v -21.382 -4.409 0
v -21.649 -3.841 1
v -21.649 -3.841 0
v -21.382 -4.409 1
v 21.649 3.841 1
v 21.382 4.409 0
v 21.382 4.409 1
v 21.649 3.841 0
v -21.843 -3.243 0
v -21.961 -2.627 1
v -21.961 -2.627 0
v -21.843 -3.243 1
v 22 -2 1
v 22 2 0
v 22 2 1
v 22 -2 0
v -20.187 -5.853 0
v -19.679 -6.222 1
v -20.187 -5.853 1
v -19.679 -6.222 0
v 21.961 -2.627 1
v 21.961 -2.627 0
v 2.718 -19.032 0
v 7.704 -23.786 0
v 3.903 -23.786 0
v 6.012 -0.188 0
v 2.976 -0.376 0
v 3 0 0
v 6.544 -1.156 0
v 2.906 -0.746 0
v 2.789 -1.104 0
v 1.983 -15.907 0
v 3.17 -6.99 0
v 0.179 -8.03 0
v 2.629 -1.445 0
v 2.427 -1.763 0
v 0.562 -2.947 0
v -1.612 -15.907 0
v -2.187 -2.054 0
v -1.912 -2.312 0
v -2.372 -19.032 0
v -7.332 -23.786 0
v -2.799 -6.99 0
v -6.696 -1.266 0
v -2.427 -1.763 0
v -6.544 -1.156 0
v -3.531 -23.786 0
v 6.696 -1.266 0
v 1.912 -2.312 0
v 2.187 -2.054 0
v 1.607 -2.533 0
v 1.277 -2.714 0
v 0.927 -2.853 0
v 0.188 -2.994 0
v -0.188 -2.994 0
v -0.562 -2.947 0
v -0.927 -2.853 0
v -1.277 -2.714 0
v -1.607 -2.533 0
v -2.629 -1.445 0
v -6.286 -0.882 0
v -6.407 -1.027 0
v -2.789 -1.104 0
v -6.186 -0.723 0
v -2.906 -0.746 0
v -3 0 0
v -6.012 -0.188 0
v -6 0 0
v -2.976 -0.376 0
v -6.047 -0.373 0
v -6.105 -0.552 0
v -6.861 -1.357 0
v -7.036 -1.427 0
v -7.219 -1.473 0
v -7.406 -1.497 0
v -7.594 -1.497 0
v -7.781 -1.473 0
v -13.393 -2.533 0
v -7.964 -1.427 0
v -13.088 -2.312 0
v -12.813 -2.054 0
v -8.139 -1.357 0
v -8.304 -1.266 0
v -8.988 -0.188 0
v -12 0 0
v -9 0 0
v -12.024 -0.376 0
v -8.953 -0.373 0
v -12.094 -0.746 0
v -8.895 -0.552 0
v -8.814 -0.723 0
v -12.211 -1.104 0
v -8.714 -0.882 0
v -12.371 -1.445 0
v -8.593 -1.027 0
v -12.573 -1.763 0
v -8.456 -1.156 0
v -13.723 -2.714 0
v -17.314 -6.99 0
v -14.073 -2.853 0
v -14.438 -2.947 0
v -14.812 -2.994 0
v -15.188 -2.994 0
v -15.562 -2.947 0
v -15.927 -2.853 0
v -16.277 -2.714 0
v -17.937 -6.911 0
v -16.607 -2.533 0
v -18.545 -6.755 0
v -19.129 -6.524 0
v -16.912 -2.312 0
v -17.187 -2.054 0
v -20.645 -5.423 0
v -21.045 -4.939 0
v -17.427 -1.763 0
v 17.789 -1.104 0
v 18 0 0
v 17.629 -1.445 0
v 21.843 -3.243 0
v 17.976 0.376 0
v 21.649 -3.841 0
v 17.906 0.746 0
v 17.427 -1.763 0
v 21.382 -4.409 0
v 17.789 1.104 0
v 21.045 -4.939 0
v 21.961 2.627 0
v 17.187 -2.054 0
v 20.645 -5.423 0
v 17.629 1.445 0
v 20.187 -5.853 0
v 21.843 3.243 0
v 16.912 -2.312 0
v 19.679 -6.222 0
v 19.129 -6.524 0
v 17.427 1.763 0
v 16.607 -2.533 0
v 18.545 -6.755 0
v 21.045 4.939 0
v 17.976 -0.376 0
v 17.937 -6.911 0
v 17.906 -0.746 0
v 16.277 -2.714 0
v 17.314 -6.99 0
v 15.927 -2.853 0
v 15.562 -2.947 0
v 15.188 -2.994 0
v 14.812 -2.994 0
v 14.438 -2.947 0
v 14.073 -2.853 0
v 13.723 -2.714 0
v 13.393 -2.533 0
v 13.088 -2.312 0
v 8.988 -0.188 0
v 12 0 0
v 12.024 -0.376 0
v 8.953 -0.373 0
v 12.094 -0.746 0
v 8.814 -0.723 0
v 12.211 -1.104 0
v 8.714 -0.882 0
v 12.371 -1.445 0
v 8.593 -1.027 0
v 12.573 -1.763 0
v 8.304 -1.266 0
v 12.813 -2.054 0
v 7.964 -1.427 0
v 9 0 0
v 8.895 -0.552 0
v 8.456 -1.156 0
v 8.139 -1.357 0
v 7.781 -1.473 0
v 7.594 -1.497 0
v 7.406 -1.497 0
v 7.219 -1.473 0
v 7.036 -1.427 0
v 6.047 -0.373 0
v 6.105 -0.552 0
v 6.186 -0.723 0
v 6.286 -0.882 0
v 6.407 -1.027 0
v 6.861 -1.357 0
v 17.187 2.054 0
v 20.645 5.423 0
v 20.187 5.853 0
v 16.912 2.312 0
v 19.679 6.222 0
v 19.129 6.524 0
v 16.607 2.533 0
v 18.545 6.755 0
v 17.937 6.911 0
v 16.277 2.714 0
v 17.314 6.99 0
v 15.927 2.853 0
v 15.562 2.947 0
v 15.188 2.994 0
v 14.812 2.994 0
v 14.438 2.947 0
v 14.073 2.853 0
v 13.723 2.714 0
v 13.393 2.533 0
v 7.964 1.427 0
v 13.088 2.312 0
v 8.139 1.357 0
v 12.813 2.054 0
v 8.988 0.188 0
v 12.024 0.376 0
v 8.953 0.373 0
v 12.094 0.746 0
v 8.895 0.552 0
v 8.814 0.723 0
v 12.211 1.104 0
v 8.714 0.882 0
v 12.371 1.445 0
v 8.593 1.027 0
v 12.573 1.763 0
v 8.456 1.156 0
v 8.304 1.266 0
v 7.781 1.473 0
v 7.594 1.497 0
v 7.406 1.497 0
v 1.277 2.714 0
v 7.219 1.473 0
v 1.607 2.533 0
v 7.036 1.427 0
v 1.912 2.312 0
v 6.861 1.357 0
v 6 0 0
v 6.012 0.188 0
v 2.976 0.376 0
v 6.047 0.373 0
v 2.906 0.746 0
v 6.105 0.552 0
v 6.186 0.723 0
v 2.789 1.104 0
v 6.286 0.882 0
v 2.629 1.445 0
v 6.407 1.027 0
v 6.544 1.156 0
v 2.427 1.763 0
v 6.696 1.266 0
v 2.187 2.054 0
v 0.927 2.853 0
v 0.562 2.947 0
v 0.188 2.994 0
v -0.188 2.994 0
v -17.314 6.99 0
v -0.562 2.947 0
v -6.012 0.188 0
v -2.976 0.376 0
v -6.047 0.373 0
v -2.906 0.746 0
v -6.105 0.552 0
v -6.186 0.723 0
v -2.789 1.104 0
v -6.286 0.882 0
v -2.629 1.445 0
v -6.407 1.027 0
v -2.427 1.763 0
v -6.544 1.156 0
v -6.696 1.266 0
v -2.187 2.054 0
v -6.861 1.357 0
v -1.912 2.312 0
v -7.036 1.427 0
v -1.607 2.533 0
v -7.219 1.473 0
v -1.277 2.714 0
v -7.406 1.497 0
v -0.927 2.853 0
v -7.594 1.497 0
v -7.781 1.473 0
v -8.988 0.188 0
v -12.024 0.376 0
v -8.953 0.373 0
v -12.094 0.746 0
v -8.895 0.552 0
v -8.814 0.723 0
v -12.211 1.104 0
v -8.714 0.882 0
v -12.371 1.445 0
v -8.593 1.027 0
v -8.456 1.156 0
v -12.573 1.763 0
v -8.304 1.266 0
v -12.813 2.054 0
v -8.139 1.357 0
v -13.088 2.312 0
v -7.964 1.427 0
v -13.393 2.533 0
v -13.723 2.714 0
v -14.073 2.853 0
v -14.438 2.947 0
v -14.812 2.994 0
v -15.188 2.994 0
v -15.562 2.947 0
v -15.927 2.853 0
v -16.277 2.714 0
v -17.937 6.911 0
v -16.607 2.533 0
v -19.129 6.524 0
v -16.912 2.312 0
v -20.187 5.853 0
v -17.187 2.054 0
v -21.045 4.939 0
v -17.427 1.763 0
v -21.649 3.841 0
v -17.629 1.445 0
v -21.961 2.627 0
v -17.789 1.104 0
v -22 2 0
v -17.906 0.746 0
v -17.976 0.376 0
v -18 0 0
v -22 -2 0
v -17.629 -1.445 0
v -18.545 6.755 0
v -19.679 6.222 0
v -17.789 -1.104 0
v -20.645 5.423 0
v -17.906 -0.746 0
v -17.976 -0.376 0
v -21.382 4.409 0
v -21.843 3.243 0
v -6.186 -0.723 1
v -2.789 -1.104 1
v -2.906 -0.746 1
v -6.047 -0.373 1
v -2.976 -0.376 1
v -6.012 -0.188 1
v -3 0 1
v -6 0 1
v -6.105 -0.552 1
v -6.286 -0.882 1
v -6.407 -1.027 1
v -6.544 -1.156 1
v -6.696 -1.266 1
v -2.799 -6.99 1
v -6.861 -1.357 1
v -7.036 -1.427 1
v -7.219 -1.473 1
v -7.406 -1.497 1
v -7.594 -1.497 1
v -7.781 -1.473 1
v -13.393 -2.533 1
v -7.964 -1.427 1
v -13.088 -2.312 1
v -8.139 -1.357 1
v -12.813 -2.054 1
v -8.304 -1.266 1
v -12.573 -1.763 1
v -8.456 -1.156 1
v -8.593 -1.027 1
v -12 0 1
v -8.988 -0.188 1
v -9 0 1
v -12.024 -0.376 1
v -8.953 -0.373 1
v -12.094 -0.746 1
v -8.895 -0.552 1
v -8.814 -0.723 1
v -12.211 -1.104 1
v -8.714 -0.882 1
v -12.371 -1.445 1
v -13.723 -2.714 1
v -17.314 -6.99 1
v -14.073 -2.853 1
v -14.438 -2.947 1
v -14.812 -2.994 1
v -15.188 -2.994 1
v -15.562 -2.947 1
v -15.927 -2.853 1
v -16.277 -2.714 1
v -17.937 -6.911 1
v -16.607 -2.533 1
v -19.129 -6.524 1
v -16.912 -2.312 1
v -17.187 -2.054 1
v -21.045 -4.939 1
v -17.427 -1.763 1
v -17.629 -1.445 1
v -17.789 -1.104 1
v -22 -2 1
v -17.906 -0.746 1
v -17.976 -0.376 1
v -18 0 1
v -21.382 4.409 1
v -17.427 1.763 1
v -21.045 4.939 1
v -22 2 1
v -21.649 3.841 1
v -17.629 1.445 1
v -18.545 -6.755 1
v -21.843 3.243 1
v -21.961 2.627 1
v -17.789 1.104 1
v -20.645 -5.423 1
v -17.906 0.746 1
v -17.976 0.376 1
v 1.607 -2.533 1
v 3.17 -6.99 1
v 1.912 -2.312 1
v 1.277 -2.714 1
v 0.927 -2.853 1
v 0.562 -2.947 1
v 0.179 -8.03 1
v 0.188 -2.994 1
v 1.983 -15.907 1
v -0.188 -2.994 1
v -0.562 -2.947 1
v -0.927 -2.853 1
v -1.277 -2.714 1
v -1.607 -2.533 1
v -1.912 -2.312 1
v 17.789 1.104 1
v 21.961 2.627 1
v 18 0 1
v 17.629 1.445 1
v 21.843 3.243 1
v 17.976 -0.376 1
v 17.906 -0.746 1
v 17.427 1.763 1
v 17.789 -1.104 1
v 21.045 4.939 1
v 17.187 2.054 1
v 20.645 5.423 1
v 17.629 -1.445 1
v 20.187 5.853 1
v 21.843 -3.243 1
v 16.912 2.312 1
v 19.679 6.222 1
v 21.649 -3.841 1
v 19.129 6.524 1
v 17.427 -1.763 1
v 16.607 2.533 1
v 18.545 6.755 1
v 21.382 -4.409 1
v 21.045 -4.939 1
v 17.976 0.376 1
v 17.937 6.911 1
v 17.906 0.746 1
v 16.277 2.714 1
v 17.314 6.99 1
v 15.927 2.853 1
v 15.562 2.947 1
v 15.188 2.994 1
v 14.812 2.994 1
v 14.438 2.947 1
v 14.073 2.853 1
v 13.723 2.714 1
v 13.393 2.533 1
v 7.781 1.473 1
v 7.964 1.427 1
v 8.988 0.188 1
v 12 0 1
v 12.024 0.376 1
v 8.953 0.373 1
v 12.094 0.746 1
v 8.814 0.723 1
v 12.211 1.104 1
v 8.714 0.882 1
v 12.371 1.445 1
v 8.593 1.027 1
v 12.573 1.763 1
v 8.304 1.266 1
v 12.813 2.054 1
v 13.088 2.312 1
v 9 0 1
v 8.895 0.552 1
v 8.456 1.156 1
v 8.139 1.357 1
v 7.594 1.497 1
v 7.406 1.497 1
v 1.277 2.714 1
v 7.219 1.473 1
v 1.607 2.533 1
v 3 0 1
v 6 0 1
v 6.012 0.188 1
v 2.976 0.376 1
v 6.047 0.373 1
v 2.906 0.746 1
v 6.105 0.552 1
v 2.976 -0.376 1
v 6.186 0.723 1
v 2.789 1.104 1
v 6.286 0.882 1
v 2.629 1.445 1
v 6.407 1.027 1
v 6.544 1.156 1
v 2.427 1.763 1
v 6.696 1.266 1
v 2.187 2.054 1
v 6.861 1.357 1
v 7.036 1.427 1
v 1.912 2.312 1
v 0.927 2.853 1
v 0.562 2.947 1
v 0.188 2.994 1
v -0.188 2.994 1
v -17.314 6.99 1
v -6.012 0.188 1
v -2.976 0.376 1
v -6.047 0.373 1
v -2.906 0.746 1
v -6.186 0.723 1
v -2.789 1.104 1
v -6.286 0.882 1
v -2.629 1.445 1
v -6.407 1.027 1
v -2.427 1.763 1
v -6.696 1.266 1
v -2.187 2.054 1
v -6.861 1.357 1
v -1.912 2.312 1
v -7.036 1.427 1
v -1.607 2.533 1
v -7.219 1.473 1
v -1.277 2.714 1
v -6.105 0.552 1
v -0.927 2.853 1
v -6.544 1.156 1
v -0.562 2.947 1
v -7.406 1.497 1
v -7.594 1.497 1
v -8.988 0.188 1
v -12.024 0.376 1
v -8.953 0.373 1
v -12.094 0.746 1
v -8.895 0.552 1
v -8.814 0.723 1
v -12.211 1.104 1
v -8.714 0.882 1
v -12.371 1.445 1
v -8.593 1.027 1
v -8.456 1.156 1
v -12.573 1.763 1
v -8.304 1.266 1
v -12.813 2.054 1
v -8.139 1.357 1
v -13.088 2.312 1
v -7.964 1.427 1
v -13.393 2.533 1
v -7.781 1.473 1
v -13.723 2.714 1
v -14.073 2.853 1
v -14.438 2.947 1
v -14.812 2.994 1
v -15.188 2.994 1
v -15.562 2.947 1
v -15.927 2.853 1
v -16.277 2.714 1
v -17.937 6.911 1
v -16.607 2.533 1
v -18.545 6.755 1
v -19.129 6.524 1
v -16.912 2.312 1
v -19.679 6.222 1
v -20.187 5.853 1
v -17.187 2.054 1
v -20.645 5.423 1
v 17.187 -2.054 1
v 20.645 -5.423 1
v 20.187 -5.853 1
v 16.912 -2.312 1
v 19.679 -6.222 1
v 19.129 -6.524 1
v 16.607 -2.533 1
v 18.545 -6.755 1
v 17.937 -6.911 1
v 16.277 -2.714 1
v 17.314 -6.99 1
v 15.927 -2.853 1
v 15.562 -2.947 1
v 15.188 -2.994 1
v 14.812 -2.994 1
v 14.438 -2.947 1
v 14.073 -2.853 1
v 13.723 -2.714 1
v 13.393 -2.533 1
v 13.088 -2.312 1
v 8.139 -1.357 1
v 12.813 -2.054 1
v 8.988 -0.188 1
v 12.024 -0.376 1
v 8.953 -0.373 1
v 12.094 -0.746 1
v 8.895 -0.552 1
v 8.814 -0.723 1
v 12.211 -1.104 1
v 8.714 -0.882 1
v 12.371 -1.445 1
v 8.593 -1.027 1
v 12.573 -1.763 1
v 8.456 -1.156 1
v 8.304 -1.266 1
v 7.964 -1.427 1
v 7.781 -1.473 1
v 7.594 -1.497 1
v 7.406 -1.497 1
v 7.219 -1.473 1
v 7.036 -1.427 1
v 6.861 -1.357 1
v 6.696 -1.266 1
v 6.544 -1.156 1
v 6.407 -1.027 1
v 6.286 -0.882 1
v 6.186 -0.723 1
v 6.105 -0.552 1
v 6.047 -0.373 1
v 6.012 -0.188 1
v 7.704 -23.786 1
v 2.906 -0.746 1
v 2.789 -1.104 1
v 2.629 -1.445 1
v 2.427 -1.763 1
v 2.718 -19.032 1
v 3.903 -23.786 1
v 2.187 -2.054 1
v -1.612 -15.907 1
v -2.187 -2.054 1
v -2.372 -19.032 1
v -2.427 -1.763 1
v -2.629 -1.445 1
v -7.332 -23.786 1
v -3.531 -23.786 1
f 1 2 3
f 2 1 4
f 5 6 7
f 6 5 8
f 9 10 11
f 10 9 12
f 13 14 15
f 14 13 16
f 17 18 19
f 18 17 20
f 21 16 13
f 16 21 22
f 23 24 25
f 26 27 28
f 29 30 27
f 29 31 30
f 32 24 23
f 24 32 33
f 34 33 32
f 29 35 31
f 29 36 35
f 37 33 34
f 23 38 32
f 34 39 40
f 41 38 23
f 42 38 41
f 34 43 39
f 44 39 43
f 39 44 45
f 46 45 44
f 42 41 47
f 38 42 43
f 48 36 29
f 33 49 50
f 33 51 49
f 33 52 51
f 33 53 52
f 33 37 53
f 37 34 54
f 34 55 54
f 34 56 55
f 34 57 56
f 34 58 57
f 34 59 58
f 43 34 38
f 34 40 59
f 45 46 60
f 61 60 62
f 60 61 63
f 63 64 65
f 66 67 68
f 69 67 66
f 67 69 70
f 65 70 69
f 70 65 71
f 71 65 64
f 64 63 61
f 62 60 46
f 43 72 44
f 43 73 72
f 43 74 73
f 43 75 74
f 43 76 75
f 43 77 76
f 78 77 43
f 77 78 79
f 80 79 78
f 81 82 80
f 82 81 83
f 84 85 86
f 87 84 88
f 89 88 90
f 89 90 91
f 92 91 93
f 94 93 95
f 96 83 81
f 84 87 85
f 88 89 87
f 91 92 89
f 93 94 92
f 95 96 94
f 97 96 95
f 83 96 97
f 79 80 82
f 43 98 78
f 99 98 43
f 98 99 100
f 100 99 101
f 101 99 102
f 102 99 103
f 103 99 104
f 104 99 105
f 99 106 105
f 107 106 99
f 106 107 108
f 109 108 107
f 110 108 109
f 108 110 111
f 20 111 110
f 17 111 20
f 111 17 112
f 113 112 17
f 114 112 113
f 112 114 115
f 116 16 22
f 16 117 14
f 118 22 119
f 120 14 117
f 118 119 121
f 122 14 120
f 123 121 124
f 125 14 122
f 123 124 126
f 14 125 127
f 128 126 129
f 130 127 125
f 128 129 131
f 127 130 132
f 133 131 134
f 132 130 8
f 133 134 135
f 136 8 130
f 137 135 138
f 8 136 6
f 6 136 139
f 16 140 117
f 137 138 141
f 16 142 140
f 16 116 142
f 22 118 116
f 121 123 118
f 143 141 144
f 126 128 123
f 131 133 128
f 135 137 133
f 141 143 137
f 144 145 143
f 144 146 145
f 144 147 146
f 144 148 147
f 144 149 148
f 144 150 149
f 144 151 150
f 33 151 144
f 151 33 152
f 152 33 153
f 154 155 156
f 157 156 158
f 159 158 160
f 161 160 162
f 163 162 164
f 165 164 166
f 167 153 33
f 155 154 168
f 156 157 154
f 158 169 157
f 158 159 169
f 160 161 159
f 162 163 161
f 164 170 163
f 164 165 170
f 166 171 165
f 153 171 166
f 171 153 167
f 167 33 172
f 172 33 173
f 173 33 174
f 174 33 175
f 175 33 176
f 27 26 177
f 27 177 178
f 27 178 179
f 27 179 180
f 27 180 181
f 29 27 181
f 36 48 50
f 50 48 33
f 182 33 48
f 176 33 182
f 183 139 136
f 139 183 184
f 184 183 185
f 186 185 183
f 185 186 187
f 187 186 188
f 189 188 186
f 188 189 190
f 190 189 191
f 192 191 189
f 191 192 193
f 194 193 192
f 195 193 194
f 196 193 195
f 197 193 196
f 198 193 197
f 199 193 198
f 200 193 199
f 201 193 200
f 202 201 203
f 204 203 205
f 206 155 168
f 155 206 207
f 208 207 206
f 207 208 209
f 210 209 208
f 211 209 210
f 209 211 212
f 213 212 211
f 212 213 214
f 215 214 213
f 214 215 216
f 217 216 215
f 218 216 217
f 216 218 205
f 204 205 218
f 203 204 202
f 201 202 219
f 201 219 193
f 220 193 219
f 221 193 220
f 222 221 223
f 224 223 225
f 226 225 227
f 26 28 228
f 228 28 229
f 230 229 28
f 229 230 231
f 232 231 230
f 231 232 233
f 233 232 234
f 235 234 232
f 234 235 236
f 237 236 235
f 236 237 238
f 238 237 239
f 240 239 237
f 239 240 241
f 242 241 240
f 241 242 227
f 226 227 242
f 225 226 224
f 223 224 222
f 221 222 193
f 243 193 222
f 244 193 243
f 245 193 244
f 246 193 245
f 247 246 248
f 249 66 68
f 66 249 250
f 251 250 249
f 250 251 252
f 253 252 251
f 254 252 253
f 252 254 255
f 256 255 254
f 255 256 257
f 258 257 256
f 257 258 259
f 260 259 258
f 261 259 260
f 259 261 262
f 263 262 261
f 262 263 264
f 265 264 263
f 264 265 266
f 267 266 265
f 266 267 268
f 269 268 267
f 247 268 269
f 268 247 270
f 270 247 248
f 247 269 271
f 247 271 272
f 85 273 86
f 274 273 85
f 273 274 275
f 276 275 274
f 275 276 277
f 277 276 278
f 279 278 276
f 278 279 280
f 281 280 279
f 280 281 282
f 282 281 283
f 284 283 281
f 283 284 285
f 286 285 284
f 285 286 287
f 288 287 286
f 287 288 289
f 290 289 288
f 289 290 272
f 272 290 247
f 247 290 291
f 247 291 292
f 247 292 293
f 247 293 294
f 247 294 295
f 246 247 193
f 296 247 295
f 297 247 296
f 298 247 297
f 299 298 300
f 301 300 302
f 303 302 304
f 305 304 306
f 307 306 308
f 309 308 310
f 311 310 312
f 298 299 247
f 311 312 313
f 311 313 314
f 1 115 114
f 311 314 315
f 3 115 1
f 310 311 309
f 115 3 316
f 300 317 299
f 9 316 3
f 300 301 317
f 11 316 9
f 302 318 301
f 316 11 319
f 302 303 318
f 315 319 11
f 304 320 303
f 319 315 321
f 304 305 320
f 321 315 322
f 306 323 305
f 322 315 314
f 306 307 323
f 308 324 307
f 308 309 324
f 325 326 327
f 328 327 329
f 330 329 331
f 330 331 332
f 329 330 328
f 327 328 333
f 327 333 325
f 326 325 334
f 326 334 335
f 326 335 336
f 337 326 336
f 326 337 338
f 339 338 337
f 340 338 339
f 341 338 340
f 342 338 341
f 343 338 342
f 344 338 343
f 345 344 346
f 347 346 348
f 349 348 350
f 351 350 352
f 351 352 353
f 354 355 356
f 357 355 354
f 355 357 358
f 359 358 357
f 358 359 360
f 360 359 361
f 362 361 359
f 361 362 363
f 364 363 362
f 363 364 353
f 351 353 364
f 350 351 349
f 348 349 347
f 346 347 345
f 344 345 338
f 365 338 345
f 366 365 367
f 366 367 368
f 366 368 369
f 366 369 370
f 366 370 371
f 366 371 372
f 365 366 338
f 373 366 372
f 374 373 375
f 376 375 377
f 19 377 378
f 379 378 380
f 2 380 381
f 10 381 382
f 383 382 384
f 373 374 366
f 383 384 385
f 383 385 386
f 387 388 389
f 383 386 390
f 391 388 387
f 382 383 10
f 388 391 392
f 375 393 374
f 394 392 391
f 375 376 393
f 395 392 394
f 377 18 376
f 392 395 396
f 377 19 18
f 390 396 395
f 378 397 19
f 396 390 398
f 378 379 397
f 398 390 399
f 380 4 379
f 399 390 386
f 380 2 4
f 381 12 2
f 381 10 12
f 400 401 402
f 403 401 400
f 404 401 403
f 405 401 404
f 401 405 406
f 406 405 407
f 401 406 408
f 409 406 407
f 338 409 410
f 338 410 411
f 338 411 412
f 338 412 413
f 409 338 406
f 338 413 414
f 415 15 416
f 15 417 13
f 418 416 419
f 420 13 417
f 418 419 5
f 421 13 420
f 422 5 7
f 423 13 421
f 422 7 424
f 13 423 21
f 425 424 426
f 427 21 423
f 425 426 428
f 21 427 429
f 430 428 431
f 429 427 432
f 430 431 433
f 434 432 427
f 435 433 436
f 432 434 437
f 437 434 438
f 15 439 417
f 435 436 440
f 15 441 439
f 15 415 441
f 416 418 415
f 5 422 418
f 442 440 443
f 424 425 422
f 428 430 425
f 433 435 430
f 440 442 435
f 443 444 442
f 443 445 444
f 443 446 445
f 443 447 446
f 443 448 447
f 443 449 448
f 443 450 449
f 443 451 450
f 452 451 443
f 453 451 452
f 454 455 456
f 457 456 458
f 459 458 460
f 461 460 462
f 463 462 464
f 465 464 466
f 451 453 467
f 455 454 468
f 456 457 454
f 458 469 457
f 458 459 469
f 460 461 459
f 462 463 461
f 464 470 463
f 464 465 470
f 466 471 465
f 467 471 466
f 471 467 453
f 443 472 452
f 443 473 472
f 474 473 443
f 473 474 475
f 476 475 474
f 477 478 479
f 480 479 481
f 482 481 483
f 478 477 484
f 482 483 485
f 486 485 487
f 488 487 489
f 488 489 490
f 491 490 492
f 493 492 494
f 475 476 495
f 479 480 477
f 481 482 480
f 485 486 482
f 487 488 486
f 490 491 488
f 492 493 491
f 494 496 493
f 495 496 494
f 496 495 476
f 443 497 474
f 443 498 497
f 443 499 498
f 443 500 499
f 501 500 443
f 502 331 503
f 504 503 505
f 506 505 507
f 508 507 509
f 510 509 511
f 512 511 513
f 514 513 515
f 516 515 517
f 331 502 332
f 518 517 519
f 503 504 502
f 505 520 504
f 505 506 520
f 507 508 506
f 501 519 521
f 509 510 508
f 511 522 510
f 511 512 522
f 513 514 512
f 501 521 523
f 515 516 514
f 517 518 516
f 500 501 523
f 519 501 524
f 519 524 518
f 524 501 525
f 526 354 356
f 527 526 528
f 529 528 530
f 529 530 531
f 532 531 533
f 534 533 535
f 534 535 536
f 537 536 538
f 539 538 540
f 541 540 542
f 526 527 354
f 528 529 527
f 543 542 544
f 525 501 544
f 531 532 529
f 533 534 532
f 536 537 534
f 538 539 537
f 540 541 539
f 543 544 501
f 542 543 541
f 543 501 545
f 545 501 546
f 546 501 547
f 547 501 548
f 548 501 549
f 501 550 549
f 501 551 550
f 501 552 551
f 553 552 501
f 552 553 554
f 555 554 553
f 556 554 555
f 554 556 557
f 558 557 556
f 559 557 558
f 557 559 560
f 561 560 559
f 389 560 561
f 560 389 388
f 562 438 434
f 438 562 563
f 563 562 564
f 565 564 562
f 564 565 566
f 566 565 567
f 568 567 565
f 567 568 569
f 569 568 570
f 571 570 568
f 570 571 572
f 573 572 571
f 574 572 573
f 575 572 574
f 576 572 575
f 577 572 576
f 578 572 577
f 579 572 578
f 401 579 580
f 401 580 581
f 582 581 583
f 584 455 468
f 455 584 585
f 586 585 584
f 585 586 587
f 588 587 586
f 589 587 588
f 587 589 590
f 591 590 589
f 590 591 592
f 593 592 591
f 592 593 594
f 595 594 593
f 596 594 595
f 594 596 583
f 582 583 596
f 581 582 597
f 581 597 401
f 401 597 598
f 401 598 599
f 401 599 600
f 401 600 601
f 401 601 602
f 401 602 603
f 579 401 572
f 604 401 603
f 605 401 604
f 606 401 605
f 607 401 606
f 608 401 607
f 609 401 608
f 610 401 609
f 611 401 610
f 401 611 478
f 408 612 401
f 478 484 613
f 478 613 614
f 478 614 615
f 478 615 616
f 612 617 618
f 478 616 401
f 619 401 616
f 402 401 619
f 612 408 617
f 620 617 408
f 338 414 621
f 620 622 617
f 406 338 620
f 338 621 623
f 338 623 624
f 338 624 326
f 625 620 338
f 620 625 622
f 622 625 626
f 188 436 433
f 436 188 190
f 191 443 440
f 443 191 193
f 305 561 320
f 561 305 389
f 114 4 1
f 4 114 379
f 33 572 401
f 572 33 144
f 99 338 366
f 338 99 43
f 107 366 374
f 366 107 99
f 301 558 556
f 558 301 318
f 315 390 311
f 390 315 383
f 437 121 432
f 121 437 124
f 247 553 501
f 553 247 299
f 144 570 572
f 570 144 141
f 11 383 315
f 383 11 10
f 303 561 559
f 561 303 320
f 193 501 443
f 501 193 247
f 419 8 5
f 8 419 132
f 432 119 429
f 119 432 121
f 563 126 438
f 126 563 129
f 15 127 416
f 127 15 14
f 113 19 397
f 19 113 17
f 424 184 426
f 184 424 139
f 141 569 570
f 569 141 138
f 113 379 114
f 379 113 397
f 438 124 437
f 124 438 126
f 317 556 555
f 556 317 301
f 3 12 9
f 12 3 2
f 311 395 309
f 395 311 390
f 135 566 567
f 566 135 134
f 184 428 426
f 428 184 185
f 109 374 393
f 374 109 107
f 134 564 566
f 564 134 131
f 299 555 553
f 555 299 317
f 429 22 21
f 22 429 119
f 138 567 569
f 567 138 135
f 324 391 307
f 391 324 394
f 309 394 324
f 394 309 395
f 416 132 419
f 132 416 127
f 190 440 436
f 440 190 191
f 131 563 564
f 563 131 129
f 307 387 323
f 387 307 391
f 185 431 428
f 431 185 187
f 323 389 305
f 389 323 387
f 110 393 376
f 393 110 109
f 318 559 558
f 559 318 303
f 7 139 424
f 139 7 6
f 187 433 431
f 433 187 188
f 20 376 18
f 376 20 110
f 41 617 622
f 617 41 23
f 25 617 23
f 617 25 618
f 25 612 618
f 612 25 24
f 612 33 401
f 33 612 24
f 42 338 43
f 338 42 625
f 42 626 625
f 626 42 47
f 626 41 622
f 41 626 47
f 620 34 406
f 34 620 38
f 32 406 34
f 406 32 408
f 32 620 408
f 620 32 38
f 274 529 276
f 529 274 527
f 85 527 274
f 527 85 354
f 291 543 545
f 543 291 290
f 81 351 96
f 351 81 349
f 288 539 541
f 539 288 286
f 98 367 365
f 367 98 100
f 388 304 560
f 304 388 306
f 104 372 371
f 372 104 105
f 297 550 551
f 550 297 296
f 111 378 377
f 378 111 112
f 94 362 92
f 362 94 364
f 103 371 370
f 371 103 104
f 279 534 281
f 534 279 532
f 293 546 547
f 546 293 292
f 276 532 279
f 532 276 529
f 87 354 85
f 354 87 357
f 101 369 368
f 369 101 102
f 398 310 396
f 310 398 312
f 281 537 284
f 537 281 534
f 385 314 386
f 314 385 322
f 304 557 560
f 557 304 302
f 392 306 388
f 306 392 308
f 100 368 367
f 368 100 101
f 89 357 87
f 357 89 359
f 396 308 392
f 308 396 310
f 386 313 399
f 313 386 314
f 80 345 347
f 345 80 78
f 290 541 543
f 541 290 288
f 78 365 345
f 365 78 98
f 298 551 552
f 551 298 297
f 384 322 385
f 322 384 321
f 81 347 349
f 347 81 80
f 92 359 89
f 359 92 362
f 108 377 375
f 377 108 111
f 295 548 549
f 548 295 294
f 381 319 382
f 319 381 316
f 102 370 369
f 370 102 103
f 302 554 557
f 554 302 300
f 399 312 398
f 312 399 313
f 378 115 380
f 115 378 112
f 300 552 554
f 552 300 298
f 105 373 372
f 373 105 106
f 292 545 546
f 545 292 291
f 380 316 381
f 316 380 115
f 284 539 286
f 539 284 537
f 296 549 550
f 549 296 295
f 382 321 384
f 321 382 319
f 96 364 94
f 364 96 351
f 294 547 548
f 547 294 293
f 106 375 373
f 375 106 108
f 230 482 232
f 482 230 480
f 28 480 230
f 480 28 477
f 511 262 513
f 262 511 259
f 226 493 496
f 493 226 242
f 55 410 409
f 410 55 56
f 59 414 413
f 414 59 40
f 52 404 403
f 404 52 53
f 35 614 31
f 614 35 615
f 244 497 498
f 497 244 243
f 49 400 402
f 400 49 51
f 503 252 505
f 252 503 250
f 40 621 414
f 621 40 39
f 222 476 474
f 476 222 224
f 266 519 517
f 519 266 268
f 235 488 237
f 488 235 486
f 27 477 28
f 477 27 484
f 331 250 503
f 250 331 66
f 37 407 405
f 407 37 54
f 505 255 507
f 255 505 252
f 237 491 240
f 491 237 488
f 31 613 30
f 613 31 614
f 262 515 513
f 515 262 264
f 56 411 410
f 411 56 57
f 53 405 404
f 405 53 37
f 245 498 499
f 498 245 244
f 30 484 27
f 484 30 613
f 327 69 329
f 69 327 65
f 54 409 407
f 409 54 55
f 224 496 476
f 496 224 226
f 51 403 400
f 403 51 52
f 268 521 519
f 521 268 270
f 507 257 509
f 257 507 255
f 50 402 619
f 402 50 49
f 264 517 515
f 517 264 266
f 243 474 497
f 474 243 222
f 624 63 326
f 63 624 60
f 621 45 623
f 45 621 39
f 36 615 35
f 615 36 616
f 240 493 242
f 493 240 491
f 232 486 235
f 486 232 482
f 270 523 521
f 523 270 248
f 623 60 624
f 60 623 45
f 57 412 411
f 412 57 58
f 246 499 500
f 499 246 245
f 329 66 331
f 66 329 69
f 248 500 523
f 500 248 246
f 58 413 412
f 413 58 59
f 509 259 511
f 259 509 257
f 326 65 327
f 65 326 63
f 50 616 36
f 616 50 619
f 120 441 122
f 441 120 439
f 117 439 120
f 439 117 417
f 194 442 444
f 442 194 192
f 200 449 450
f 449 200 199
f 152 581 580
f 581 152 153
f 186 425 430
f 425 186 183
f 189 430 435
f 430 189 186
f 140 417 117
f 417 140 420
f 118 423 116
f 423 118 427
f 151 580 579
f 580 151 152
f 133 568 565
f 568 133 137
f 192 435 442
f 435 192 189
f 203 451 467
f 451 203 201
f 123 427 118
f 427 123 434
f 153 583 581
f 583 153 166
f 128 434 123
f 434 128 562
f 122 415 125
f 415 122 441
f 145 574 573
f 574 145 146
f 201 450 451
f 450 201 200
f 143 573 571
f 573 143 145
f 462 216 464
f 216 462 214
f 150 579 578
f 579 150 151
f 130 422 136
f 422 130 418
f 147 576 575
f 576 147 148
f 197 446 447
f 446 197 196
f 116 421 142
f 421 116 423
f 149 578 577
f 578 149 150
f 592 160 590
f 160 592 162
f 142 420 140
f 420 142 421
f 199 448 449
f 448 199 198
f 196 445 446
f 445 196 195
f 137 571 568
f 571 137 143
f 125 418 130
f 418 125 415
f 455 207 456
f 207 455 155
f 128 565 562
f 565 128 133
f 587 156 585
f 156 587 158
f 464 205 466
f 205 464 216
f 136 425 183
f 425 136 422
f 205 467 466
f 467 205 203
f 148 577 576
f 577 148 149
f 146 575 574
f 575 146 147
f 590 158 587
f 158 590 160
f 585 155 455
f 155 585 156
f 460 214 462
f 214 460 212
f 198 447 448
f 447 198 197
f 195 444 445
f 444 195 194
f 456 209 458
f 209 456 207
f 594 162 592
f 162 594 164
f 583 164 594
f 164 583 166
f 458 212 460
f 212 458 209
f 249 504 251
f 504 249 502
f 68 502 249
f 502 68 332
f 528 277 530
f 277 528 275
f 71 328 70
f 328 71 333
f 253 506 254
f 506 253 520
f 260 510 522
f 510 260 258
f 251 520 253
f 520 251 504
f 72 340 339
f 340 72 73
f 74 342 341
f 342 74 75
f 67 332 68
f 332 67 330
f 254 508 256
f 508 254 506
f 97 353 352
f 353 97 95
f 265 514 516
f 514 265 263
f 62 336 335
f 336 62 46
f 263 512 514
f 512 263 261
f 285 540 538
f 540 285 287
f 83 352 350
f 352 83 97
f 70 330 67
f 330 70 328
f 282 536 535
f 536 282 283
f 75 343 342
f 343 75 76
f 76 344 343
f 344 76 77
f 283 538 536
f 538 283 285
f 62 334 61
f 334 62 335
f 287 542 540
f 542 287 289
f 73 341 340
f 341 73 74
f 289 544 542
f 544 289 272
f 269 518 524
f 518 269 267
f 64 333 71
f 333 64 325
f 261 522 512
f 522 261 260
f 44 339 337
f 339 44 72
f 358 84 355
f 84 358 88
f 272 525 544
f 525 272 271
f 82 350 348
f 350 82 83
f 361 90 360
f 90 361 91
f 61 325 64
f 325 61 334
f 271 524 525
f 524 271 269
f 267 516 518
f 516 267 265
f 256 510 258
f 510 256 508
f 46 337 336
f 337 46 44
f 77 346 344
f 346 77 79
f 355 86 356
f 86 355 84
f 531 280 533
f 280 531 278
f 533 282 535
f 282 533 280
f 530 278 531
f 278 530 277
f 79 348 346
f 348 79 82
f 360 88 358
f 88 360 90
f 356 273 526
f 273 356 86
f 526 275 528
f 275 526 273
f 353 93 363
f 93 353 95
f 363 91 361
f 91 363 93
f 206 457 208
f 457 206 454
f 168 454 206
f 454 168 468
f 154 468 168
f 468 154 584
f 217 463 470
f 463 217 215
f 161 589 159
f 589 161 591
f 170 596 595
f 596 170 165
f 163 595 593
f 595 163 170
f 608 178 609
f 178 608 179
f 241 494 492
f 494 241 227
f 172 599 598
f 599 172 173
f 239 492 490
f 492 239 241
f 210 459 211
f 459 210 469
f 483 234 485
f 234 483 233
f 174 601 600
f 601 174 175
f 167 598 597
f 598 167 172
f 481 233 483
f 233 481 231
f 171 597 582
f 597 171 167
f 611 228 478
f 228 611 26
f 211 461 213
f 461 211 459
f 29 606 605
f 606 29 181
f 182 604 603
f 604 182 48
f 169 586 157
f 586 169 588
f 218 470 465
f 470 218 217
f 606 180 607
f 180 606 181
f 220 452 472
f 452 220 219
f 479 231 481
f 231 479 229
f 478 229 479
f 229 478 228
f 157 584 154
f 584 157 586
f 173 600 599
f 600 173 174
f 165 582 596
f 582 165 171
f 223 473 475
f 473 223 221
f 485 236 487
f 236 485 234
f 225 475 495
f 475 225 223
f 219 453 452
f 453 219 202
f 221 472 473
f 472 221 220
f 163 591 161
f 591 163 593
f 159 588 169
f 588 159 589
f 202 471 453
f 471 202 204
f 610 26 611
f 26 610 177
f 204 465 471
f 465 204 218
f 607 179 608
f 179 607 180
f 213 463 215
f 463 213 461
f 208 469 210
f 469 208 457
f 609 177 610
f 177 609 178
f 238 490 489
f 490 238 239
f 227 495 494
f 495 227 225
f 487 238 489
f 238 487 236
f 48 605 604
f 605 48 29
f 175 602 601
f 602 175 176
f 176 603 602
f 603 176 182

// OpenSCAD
$fn = 50;


difference() {
	union() {
		hull() {
			translate(v = [-17.0000000000, 2.0000000000, 0]) {
				cylinder(h = 1, r = 5);
			}
			translate(v = [17.0000000000, 2.0000000000, 0]) {
				cylinder(h = 1, r = 5);
			}
			translate(v = [-17.0000000000, -2.0000000000, 0]) {
				cylinder(h = 1, r = 5);
			}
			translate(v = [17.0000000000, -2.0000000000, 0]) {
				cylinder(h = 1, r = 5);
			}
		}
		translate(v = [0, -5, 0]) {
			linear_extrude(height = 1) {
				text(font = "DejaVu Sans Mono:style=Bold", halign = "center", size = 19.0000000000, text = "A", valign = "top");
			}
		}
	}
	union() {
		translate(v = [-15.0000000000, 0.0000000000, 0]) {
			translate(v = [0, 0, -100]) {
				cylinder(h = 200, r = 3.0000000000);
			}
		}
		translate(v = [0, 0, -100]) {
			cylinder(h = 200, r = 3.0000000000);
		}
		translate(v = [15.0000000000, 0.0000000000, 0]) {
			translate(v = [0, 0, -100]) {
				cylinder(h = 200, r = 3.0000000000);
			}
		}
		translate(v = [-15.0000000000, 0.0000000000, 0]) {
			translate(v = [0, 0, -100]) {
				cylinder(h = 200, r = 1.5000000000);
			}
		}
		translate(v = [-7.5000000000, 0.0000000000, 0]) {
			translate(v = [0, 0, -100]) {
				cylinder(h = 200, r = 1.5000000000);
			}
		}
		translate(v = [0, 0, -100]) {
			cylinder(h = 200, r = 1.5000000000);
		}
		translate(v = [7.5000000000, 0.0000000000, 0]) {
			translate(v = [0, 0, -100]) {
				cylinder(h = 200, r = 1.5000000000);
			}
		}
		translate(v = [15.0000000000, 0.0000000000, 0]) {
			translate(v = [0, 0, -100]) {
				cylinder(h = 200, r = 1.5000000000);
			}
		}
	}
}
